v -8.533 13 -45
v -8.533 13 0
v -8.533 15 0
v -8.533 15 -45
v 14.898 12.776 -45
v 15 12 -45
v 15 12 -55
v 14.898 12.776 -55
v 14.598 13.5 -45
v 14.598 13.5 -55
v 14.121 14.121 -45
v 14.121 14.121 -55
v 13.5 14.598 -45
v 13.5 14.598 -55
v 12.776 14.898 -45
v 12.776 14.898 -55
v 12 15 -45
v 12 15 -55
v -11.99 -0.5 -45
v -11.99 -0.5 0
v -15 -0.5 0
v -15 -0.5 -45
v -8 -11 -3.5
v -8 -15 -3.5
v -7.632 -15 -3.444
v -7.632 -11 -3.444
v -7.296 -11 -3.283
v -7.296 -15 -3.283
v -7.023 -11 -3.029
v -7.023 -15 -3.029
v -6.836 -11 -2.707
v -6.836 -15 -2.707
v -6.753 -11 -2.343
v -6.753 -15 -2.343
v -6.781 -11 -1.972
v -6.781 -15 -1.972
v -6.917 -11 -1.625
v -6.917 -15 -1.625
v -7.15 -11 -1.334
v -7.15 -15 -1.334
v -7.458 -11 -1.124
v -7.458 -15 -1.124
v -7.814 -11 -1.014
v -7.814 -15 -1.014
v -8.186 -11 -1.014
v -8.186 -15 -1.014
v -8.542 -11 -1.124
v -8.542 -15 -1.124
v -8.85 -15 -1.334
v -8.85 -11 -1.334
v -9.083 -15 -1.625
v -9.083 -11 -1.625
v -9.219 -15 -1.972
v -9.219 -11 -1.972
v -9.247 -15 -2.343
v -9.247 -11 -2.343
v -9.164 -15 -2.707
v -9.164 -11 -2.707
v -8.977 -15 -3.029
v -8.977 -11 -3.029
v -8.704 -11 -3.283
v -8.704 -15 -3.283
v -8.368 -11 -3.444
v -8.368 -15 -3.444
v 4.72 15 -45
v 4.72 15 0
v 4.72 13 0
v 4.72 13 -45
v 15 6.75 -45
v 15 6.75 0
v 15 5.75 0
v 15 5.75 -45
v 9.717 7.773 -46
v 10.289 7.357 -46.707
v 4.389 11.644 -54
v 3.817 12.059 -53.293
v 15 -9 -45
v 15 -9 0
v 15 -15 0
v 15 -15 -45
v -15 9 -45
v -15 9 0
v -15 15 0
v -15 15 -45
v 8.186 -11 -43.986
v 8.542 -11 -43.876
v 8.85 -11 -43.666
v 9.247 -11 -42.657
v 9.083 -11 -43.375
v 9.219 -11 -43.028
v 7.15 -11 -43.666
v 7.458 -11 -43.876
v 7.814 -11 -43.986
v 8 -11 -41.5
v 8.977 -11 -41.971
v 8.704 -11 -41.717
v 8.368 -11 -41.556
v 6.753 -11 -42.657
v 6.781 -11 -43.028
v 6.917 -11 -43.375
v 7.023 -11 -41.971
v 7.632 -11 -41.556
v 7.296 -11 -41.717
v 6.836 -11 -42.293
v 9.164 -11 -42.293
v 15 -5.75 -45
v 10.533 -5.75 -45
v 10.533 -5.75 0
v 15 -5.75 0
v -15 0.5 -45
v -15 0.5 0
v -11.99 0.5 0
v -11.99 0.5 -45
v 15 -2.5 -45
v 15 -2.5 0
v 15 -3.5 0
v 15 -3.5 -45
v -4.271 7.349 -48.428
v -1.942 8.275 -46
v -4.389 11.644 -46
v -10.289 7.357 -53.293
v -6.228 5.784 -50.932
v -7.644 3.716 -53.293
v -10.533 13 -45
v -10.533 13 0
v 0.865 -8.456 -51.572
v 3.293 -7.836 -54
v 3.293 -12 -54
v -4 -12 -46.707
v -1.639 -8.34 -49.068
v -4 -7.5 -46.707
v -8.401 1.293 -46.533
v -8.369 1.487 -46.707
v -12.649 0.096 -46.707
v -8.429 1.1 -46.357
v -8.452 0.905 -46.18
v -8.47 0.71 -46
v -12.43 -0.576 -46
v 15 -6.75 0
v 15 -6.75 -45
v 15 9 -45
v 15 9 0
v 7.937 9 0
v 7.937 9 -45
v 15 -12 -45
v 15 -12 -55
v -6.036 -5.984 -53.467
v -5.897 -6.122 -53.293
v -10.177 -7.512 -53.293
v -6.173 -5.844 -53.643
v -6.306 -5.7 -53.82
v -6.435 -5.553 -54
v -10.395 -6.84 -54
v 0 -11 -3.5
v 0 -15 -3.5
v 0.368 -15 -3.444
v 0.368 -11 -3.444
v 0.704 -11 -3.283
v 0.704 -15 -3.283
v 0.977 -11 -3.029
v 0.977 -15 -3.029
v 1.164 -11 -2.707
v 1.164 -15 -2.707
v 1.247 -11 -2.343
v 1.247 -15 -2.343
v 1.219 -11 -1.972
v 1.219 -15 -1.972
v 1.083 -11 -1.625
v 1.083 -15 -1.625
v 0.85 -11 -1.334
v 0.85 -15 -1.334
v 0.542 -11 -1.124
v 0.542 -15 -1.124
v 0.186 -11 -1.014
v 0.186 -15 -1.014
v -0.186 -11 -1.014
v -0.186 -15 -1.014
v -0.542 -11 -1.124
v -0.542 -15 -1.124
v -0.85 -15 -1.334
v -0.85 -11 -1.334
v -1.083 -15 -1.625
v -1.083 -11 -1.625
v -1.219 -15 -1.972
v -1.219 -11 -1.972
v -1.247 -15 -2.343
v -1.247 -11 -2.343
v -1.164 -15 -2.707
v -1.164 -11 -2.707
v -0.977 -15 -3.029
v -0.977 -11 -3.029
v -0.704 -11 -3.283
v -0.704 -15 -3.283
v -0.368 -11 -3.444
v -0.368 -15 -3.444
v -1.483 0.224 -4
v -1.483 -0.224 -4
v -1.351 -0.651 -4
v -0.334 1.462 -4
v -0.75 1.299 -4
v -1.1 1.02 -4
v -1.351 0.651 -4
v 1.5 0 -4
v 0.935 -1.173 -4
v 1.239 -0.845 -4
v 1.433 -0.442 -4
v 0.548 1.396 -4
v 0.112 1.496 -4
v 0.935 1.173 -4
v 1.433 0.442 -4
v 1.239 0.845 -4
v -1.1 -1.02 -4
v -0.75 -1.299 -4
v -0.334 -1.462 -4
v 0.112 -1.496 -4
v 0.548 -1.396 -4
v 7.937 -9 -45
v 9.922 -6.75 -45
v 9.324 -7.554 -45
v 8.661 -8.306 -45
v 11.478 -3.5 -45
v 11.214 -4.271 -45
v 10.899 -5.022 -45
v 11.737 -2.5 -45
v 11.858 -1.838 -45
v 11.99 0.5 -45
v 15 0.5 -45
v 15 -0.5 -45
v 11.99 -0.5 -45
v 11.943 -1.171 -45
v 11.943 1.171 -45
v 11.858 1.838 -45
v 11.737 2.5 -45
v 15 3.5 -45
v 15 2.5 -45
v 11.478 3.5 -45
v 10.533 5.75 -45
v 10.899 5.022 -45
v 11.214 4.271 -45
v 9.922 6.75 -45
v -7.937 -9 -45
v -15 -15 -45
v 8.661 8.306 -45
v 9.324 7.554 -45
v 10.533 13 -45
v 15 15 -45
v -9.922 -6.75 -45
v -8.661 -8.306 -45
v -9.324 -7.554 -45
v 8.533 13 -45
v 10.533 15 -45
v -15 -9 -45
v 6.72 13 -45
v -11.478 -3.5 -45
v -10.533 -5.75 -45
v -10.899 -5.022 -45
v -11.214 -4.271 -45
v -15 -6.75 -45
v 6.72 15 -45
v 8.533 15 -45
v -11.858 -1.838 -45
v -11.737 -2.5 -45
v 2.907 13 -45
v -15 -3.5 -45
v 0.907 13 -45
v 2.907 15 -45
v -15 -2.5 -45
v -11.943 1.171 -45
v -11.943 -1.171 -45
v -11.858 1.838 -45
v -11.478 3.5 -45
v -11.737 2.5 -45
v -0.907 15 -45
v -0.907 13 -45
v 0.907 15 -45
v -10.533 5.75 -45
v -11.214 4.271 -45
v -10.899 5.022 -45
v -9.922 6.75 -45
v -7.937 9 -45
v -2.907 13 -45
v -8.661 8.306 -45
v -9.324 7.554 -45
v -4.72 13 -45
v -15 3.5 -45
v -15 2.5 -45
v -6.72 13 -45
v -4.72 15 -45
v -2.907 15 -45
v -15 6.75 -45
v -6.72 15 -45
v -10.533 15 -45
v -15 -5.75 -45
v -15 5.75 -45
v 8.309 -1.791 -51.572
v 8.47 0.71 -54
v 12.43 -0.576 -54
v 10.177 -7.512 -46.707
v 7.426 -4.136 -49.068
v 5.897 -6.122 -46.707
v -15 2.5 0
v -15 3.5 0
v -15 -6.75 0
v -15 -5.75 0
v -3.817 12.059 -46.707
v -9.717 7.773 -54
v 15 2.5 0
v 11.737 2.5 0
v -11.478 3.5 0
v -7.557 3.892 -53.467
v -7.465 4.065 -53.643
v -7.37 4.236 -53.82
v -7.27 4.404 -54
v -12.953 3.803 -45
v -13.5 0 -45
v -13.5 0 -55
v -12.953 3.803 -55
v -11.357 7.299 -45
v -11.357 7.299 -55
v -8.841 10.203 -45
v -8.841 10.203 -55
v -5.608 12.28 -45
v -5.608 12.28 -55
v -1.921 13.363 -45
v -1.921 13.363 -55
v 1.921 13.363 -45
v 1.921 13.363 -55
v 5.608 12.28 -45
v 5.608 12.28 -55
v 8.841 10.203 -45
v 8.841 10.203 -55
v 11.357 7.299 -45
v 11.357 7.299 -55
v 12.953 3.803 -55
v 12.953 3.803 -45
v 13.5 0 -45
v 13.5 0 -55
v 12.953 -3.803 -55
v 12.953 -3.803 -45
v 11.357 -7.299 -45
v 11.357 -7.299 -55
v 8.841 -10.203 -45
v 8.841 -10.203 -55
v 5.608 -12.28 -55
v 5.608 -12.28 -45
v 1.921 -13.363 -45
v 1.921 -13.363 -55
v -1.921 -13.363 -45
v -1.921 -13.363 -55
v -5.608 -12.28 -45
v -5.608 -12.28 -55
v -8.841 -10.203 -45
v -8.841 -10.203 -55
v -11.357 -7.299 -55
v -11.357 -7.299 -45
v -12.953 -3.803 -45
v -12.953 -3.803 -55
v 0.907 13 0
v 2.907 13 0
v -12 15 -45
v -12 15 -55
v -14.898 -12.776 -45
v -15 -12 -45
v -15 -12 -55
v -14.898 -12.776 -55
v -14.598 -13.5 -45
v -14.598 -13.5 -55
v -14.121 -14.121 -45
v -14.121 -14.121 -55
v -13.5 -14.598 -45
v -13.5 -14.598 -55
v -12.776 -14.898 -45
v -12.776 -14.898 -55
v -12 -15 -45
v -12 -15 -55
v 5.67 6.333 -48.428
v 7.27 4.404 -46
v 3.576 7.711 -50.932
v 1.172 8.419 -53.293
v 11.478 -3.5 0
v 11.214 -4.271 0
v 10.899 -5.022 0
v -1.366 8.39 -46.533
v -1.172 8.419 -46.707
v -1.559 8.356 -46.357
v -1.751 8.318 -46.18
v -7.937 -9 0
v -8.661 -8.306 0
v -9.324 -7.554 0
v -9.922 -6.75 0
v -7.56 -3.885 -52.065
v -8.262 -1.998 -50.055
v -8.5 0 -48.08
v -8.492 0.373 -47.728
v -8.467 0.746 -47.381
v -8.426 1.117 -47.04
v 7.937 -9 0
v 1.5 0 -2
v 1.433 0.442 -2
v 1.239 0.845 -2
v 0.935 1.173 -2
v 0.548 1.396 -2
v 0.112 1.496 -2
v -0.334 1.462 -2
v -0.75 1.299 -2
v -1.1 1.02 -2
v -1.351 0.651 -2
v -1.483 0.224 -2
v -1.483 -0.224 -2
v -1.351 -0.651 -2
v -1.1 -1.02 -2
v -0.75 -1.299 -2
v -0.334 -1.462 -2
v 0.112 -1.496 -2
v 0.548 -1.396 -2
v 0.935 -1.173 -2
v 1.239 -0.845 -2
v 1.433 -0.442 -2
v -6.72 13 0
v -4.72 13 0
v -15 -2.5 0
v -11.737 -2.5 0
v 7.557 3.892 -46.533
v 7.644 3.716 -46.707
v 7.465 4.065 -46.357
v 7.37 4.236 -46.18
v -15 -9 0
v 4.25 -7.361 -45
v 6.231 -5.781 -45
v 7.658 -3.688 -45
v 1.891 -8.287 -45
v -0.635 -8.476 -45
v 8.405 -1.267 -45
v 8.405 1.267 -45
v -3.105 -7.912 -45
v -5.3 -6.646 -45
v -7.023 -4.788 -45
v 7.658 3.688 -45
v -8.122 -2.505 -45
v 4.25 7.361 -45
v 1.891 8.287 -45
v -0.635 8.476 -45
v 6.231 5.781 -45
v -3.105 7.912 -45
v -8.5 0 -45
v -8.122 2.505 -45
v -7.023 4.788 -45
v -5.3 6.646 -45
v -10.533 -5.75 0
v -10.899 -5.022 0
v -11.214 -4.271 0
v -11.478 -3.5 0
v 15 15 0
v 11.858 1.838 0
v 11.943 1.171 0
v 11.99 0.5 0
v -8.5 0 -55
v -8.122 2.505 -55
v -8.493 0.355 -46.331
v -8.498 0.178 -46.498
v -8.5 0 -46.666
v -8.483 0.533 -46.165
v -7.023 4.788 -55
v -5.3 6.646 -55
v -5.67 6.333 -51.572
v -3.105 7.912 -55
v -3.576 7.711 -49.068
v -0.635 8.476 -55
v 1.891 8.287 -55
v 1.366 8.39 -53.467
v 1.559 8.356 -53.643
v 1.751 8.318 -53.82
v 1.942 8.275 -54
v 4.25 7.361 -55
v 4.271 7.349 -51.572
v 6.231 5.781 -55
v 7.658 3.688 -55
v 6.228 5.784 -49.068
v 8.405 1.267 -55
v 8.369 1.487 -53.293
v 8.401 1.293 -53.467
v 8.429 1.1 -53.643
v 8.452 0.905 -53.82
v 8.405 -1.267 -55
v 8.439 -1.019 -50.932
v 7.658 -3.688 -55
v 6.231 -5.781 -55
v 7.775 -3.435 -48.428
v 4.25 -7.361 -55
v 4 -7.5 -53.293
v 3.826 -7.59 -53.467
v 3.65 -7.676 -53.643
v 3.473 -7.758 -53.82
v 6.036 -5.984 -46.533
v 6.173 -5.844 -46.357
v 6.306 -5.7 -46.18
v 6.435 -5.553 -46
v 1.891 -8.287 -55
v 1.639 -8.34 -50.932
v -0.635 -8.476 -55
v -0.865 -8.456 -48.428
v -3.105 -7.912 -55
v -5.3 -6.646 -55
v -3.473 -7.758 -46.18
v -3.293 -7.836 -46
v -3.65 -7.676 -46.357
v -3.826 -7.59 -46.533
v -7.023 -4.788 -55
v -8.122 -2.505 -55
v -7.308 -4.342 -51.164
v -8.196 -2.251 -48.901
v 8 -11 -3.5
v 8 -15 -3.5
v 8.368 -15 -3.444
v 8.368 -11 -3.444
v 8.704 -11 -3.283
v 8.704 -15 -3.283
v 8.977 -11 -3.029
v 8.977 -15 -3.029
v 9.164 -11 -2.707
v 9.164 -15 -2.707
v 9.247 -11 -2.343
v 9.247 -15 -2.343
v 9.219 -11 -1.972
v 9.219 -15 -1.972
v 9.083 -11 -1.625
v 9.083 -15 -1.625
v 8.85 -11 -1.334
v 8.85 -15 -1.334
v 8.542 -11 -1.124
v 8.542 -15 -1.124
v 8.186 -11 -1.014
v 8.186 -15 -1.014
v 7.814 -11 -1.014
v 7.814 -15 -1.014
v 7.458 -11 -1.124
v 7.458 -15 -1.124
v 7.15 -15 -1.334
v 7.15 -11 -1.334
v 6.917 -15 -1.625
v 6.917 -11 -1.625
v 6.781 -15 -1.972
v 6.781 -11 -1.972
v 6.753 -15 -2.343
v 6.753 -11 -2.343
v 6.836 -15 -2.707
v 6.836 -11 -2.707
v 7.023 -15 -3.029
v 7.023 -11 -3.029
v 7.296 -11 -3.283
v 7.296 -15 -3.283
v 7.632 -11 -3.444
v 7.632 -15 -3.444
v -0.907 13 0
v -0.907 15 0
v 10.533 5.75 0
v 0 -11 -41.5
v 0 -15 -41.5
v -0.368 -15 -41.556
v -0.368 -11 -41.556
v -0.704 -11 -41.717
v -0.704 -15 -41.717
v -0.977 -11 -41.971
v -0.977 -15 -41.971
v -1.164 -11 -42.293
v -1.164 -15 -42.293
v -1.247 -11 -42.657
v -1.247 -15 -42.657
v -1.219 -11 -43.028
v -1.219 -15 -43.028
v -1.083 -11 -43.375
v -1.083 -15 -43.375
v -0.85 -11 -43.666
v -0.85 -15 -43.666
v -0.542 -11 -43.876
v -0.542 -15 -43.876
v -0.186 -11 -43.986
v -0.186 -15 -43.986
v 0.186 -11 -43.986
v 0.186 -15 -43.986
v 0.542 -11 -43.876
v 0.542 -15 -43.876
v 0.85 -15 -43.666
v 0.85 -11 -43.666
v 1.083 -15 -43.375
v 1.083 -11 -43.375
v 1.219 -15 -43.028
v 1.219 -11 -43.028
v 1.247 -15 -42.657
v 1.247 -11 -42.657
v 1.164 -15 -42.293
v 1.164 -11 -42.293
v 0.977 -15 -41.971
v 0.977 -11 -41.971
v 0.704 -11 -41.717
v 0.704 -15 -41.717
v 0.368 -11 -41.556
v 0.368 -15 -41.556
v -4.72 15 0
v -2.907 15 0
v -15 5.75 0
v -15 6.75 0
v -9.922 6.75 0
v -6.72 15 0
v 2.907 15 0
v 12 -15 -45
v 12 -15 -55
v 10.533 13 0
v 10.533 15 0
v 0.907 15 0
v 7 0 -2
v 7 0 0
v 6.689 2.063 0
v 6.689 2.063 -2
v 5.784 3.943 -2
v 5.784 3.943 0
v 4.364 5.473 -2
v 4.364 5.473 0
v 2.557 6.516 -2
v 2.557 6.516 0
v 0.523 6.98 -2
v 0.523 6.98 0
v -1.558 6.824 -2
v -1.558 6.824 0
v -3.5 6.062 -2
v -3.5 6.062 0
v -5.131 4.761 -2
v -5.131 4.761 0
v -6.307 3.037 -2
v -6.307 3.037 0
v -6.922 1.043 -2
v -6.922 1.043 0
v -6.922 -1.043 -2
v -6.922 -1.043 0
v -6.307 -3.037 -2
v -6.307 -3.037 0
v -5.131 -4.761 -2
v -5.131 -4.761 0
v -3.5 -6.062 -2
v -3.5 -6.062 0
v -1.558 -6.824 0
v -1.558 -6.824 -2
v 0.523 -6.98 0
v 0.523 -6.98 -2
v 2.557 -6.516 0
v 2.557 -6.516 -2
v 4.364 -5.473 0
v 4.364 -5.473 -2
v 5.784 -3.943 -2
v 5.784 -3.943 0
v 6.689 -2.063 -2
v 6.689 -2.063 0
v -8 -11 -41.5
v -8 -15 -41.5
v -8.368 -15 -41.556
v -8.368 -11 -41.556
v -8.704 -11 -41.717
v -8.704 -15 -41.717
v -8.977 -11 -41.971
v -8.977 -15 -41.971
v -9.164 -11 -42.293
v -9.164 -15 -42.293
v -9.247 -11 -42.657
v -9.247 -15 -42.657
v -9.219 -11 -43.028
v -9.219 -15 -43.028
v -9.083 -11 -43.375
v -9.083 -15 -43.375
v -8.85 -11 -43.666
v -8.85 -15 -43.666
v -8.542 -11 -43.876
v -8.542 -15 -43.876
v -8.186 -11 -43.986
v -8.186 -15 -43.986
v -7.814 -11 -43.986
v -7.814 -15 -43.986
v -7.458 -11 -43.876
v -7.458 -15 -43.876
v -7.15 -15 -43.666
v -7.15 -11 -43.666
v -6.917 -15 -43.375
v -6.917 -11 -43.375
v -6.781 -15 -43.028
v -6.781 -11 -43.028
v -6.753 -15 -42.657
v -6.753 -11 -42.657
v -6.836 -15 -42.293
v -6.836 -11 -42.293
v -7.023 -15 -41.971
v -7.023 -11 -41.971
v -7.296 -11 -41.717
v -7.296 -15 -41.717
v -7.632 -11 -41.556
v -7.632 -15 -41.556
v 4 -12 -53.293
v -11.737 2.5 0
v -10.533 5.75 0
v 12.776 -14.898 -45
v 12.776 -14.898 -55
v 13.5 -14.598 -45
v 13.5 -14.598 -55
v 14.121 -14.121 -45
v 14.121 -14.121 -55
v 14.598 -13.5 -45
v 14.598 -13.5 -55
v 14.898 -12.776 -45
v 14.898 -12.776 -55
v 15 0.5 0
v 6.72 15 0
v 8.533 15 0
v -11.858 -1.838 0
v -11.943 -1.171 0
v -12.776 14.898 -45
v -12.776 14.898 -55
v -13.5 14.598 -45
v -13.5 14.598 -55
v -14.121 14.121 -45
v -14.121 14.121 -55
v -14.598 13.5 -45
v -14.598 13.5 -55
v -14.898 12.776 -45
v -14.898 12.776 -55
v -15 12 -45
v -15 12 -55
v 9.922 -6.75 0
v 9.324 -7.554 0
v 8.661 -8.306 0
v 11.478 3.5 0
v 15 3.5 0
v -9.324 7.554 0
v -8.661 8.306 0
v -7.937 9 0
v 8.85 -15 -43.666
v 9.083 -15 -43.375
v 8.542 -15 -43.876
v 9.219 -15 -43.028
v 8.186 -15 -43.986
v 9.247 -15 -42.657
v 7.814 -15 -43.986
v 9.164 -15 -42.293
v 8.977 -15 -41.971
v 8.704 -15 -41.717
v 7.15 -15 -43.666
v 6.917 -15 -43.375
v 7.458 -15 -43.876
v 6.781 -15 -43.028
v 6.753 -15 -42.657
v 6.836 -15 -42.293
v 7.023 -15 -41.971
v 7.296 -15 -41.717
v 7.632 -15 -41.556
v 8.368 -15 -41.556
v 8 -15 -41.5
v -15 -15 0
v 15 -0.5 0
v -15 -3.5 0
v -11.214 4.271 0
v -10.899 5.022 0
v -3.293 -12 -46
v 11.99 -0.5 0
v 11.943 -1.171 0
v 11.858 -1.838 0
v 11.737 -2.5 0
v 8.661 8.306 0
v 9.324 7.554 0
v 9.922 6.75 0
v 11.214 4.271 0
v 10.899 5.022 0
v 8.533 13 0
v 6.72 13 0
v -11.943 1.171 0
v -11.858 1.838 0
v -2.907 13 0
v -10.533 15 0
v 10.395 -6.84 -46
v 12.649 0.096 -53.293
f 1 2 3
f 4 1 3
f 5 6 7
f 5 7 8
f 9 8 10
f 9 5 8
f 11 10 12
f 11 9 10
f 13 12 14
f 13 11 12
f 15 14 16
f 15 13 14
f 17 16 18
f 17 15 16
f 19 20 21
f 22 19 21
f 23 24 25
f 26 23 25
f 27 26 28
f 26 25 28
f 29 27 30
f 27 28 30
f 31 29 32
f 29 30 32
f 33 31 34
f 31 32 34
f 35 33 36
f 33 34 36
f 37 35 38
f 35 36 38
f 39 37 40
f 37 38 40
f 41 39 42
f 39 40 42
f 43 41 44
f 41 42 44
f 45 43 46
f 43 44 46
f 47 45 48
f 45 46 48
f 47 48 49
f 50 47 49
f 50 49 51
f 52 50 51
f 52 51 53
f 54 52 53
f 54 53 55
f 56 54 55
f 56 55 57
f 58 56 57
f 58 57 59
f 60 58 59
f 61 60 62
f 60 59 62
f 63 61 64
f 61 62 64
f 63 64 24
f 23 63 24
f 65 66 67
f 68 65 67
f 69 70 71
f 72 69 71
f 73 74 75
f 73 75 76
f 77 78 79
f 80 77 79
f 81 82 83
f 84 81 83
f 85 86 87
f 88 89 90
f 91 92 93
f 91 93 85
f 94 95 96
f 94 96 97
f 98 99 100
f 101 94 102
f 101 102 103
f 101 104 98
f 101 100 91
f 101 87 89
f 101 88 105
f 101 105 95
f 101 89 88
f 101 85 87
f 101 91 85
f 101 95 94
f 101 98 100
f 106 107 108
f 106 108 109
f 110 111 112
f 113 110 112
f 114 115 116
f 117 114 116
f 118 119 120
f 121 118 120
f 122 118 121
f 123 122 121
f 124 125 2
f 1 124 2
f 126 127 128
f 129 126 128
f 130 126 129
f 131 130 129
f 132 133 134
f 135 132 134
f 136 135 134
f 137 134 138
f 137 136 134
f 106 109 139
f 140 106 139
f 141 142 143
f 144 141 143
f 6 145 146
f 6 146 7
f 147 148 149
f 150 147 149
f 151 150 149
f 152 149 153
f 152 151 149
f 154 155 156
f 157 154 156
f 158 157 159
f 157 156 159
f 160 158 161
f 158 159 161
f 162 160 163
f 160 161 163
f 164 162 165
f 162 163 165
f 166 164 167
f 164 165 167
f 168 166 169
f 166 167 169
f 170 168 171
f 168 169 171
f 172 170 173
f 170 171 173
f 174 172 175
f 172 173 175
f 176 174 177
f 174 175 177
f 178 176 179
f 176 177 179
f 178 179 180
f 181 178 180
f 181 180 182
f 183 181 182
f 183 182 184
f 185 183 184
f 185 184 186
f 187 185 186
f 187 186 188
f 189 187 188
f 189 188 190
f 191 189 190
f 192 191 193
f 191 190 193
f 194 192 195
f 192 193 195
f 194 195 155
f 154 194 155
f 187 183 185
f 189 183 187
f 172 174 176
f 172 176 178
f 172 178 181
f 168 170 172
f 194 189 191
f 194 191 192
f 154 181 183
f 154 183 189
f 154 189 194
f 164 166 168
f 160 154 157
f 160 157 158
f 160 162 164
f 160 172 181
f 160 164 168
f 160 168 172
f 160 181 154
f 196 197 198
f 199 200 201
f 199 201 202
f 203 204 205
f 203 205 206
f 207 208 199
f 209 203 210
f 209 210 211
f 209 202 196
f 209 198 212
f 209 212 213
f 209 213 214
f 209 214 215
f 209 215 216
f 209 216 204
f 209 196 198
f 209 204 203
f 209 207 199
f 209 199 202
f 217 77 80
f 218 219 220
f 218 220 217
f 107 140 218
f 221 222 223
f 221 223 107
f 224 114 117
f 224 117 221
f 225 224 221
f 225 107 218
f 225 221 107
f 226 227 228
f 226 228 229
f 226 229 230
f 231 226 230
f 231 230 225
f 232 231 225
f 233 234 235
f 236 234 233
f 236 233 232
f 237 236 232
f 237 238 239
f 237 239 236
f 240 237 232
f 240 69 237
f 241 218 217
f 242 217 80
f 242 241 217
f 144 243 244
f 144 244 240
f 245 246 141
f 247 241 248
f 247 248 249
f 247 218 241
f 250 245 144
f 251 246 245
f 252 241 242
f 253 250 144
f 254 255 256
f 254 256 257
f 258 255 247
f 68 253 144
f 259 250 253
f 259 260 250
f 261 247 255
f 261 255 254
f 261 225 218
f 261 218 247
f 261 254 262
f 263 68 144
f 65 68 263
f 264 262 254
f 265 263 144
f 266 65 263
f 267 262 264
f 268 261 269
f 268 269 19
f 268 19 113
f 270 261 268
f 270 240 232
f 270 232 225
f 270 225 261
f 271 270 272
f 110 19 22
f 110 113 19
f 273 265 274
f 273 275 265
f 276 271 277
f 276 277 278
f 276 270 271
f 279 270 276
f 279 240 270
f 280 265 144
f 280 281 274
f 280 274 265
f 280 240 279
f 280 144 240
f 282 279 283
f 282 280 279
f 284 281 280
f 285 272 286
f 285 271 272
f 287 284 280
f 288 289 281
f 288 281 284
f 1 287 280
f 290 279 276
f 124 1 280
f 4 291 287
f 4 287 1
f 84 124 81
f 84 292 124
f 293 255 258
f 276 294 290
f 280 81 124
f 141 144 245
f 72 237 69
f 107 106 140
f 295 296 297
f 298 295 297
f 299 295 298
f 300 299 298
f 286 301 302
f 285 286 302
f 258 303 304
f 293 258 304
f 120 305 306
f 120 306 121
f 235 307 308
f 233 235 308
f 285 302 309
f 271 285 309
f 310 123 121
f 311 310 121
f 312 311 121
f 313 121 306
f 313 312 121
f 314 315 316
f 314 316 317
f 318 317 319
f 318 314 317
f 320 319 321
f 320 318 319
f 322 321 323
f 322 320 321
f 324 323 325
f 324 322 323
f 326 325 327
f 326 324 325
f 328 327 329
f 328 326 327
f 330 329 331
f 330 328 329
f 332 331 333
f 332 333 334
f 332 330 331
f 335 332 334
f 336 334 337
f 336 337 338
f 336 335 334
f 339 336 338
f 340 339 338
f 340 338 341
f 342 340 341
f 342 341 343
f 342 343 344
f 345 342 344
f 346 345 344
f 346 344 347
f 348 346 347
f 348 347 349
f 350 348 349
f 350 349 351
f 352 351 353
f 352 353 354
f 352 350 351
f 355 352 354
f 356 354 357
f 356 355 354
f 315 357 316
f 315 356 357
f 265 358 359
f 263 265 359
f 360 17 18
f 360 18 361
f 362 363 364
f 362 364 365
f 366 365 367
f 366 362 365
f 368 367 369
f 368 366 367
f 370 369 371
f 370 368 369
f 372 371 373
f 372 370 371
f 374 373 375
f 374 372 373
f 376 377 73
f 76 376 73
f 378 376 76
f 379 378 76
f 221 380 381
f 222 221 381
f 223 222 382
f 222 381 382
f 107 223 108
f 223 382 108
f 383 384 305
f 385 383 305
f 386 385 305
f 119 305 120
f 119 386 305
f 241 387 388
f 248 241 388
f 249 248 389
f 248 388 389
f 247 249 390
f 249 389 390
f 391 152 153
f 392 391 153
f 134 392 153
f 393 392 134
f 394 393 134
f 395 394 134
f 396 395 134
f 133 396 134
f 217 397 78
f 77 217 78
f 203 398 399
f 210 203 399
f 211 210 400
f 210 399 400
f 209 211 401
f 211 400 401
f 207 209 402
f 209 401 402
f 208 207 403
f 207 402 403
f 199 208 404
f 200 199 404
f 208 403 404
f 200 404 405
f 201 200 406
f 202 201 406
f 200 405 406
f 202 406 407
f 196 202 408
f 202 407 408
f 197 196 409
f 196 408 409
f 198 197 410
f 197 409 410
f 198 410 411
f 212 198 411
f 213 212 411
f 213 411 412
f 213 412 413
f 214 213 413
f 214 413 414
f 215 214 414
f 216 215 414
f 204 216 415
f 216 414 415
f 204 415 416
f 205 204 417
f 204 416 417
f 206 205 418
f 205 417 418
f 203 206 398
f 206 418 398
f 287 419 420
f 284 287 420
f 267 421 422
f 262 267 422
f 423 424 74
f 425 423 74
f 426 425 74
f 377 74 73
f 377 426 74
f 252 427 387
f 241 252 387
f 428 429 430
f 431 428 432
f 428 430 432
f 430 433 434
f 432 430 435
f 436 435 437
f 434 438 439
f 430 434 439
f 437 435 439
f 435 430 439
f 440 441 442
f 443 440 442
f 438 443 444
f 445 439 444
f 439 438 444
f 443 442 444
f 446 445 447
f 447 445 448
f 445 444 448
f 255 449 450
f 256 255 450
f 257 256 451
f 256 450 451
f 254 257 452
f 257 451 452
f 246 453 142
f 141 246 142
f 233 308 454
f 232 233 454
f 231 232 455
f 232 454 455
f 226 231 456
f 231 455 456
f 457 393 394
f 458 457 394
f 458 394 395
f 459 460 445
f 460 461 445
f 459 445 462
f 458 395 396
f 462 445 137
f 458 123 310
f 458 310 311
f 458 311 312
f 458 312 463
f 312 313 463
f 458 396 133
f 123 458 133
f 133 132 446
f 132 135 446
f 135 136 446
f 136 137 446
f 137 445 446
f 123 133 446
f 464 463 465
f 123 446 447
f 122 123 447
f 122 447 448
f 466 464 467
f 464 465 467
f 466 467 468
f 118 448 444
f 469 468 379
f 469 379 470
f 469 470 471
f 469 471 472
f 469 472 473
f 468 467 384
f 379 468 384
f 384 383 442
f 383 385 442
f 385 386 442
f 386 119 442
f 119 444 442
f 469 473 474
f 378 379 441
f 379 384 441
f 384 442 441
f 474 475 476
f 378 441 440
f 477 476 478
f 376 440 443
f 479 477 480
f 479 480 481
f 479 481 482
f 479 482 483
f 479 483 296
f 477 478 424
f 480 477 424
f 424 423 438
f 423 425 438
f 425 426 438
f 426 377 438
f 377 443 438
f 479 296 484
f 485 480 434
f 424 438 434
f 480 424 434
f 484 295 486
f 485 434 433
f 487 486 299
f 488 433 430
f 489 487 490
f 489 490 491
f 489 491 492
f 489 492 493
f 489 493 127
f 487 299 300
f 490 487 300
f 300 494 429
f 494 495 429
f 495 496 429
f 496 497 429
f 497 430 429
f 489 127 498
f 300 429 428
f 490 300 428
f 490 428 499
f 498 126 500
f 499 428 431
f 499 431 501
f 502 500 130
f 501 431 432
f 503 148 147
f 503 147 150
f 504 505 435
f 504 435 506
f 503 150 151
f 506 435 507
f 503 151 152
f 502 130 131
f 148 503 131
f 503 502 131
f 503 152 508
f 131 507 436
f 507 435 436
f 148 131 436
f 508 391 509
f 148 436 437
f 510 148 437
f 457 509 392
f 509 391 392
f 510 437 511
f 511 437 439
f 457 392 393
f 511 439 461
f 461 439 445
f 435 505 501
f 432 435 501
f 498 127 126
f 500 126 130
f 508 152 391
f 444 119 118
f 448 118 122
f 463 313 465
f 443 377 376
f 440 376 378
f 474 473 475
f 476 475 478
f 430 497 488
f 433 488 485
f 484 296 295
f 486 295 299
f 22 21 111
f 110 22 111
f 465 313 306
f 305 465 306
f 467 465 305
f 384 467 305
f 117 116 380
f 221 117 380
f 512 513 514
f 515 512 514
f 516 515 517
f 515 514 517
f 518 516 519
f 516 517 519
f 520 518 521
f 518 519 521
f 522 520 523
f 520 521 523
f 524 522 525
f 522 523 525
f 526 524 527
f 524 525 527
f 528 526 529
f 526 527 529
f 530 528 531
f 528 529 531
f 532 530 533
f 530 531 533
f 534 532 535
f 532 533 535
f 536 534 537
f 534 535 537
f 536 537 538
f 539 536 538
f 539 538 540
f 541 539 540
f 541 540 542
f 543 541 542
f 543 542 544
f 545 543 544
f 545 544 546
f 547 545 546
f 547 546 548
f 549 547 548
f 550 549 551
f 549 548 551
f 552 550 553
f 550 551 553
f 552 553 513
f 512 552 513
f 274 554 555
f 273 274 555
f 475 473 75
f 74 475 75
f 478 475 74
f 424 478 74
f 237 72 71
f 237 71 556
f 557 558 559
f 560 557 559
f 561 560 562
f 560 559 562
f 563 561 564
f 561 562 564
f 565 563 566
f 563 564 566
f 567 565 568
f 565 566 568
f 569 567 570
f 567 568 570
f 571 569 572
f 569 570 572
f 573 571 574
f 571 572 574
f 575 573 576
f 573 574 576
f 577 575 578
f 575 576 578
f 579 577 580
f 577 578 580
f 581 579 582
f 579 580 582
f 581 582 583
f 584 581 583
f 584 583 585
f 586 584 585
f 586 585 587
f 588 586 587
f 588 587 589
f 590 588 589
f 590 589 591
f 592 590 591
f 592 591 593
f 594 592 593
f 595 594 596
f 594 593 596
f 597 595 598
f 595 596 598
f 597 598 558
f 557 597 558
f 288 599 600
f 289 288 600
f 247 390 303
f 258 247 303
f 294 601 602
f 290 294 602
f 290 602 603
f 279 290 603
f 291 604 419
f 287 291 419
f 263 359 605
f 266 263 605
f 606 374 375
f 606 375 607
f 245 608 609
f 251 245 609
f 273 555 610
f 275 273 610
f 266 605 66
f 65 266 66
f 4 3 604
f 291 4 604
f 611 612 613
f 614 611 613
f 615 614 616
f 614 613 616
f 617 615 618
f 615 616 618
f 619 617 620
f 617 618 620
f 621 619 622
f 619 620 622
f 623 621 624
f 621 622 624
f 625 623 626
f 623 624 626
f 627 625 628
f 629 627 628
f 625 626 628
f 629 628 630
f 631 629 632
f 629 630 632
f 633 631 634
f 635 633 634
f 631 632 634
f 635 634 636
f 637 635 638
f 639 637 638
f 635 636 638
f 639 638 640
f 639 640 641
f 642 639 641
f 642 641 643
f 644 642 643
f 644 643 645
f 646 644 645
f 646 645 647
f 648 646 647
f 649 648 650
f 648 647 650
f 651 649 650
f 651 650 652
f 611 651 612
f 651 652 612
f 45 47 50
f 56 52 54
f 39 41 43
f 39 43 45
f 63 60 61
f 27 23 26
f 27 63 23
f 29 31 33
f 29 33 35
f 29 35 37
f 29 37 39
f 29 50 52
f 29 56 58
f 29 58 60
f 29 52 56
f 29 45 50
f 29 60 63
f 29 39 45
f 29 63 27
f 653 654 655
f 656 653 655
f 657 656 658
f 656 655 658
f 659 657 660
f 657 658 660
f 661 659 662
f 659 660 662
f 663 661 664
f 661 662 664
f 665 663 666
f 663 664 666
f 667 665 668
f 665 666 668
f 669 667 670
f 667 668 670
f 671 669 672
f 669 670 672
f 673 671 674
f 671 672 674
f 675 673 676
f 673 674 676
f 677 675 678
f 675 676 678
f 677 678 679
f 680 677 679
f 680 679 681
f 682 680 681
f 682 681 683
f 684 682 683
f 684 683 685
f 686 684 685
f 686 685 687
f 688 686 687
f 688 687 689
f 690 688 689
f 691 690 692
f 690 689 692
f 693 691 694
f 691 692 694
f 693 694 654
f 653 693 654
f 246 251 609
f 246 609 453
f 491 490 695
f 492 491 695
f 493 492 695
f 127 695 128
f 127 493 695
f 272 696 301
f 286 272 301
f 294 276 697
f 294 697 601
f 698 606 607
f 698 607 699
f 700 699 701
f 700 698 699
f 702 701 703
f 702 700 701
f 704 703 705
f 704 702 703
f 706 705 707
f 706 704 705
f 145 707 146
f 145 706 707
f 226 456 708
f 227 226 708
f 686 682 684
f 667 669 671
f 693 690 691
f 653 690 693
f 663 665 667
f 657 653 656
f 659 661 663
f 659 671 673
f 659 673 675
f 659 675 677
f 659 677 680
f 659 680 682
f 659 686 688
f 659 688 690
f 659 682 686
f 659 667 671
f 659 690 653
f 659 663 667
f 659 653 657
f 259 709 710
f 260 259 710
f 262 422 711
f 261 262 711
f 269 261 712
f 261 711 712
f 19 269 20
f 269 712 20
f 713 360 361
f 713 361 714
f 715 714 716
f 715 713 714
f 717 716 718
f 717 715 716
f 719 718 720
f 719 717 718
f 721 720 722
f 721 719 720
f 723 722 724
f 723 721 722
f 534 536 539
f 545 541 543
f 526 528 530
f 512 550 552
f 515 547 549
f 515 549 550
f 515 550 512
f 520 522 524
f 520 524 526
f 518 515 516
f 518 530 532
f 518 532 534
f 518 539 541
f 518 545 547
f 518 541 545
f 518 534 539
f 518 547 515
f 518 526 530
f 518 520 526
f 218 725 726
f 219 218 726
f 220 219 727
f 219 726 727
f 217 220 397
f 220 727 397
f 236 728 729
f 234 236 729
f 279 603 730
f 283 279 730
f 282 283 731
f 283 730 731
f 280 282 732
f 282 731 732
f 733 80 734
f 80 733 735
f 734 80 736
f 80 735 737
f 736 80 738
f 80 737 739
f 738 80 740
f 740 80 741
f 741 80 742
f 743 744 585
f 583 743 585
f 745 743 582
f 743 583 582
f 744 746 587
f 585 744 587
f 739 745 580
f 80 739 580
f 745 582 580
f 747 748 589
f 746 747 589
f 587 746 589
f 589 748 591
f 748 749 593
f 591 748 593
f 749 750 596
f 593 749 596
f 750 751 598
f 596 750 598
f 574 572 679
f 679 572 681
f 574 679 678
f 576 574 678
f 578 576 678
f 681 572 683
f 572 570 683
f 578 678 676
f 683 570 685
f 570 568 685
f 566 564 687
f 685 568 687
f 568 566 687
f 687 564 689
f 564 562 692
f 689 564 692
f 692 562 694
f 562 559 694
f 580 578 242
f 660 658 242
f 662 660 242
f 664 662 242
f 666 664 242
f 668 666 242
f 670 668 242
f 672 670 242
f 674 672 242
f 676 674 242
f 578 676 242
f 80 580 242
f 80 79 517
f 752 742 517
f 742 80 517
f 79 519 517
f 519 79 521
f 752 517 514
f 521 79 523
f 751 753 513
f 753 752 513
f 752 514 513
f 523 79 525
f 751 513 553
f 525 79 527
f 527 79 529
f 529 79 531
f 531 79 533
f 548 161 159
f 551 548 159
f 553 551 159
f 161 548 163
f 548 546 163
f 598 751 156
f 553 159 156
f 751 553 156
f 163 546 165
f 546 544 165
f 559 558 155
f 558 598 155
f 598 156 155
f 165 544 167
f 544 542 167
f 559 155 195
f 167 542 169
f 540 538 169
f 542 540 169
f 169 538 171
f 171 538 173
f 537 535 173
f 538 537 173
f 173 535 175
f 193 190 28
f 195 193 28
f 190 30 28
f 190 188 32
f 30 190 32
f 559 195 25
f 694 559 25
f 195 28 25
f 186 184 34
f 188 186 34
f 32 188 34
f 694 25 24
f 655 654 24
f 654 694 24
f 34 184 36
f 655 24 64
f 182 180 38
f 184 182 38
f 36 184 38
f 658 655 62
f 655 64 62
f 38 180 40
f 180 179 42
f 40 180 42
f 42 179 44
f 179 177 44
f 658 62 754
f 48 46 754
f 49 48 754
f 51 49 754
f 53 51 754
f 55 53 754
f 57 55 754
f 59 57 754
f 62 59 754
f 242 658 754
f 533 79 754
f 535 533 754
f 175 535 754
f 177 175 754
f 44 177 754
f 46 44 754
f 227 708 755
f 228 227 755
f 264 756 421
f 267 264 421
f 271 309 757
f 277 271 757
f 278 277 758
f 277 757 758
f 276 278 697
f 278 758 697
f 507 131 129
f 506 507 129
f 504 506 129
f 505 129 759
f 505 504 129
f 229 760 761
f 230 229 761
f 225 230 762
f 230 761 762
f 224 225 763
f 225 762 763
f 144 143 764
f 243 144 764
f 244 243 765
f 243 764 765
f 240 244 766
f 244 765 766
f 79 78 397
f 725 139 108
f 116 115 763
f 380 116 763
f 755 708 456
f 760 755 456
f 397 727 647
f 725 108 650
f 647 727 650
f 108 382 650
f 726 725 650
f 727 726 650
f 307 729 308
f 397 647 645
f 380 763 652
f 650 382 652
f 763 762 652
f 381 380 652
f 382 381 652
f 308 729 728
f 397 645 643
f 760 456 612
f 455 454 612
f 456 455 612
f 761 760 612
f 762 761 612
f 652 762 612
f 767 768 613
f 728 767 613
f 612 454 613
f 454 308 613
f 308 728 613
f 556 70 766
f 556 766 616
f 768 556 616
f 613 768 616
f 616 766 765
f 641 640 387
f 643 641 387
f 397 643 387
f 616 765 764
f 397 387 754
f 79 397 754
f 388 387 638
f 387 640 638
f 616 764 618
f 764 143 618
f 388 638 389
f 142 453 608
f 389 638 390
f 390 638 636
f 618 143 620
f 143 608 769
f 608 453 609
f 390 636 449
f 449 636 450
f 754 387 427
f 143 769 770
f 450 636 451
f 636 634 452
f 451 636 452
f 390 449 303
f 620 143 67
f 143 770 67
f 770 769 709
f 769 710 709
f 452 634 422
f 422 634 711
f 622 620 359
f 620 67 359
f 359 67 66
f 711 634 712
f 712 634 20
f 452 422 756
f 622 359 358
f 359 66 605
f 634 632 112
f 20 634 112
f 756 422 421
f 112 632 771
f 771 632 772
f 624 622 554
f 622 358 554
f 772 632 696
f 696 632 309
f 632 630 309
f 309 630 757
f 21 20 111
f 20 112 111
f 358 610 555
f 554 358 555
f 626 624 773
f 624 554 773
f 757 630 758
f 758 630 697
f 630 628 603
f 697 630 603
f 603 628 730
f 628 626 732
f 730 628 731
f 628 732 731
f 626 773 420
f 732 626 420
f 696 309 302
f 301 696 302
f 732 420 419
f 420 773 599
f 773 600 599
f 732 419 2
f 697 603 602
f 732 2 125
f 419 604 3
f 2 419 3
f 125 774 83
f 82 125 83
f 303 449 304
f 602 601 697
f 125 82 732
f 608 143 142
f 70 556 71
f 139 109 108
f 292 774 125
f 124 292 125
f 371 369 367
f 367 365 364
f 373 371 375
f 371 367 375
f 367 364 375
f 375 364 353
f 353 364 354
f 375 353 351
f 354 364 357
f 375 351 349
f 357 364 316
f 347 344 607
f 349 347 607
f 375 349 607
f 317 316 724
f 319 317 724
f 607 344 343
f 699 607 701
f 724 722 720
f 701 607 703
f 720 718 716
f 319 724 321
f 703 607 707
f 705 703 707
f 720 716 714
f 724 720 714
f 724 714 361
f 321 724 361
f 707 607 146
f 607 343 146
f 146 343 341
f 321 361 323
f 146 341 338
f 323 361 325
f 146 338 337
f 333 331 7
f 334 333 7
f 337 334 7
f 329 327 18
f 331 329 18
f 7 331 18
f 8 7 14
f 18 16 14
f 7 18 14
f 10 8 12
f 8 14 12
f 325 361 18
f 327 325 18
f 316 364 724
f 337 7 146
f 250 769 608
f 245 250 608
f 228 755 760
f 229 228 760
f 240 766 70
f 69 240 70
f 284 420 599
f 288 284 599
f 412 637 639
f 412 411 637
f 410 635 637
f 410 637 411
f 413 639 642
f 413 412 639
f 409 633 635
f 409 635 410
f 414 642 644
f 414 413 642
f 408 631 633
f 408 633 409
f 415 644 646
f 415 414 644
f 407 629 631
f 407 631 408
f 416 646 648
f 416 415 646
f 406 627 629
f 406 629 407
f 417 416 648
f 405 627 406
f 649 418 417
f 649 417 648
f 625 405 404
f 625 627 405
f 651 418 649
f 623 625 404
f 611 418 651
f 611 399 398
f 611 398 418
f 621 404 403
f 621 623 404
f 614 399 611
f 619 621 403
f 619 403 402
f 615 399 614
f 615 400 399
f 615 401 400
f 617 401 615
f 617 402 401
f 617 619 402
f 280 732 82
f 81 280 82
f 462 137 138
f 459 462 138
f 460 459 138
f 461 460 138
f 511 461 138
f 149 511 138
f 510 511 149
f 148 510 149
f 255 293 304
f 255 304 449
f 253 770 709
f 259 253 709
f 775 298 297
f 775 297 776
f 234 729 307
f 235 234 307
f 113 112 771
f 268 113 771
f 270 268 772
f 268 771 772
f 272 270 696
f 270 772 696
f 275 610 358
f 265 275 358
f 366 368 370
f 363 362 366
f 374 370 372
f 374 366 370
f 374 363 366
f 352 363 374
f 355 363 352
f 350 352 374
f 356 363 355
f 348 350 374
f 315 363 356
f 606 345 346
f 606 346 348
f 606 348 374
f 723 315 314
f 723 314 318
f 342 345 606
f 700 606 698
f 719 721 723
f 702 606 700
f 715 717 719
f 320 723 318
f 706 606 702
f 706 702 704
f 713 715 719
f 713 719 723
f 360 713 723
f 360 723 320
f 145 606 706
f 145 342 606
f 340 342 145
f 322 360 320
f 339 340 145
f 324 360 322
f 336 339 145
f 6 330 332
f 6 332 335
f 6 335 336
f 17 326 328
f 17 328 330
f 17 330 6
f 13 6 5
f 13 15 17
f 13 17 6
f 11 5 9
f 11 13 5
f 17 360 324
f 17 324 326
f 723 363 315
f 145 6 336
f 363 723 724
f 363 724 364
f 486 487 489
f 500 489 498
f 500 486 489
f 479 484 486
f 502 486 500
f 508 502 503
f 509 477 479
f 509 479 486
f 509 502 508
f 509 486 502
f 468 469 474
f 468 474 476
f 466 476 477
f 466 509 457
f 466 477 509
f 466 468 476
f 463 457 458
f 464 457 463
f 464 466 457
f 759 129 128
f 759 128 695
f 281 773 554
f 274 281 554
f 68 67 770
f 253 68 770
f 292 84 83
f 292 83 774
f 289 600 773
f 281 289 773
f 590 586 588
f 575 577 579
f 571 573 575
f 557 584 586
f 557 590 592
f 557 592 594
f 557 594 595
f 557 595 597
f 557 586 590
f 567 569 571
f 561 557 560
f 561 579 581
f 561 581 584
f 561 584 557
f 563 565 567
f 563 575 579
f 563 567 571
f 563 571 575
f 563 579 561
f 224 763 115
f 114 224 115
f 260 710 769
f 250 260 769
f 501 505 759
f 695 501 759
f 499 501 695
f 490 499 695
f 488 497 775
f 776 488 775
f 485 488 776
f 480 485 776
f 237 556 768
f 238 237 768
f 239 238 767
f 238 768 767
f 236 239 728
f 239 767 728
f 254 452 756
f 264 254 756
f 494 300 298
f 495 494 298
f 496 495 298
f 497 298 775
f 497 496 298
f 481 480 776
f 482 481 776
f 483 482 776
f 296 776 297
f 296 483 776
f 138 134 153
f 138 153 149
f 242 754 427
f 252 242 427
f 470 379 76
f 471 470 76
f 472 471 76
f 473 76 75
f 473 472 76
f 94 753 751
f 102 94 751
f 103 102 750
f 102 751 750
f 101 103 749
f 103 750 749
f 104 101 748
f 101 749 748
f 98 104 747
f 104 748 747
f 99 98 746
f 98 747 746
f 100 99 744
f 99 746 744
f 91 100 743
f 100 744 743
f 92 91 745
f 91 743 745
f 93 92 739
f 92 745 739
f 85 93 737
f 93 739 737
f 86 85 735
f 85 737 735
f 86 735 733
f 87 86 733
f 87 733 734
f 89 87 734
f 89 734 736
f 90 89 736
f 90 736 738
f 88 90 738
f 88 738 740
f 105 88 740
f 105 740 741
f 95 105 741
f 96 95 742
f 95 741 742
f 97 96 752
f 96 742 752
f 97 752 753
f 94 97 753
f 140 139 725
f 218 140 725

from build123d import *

# Parameters (mm, degrees)
BOSS_EXTRUDE1_DEPTH = 45
SKETCH2_R           = 7
CUT_EXTRUDE1_DEPTH  = 2
SKETCH3_R           = 1.5
CUT_EXTRUDE2_DEPTH  = 2
SKETCH4_R           = 1.25
CUT_EXTRUDE5_DEPTH  = 4
SKETCH5_R           = 13.5
BOSS_EXTRUDE2_DEPTH = 10
SKETCH6_R           = 8.5
BOSS_EXTRUDE3_DEPTH = 10
BOSS_EXTRUDE4_DEPTH = 12
CIRPATTERN1_COUNT   = 5


with BuildPart() as part:
    # Sketch1 → Boss-Extrude1 (new body)
    with BuildSketch(Plane.XY):
        with BuildLine():
            Line((-15, -9), (-7.937253933, -9))
            ThreePointArc((-7.937253933, -9), (-9, -7.937253933), (-9.921567416, -6.75))
            Line((-9.921567416, -6.75), (-15, -6.75))
            Line((-15, -6.75), (-15, -5.75))
            Line((-15, -5.75), (-10.532687216, -5.75))
            ThreePointArc((-10.532687216, -5.75), (-11.06281417, -4.649101273), (-11.478240283, -3.5))
            Line((-11.478240283, -3.5), (-15, -3.5))
            Line((-15, -3.5), (-15, -2.5))
            Line((-15, -2.5), (-11.736694594, -2.5))
            ThreePointArc((-11.736694594, -2.5), (-11.905209464, -1.505319769), (-11.989578808, -0.5))
            Line((-11.989578808, -0.5), (-15, -0.5))
            Line((-15, -0.5), (-15, 0.5))
            Line((-15, 0.5), (-11.989578808, 0.5))
            ThreePointArc((-11.989578808, 0.5), (-11.905209464, 1.505319769), (-11.736694594, 2.5))
            Line((-11.736694594, 2.5), (-15, 2.5))
            Line((-15, 2.5), (-15, 3.5))
            Line((-15, 3.5), (-11.478240283, 3.5))
            ThreePointArc((-11.478240283, 3.5), (-11.06281417, 4.649101273), (-10.532687216, 5.75))
            Line((-10.532687216, 5.75), (-15, 5.75))
            Line((-15, 5.75), (-15, 6.75))
            Line((-15, 6.75), (-9.921567416, 6.75))
            ThreePointArc((-9.921567416, 6.75), (-9, 7.937253933), (-7.937253933, 9))
            Line((-7.937253933, 9), (-15, 9))
            Line((-15, 9), (-15, 15))
            Line((-15, 15), (-10.532687216, 15))
            Line((-10.532687216, 15), (-10.532687216, 13))
            Line((-10.532687216, 13), (-8.532687216, 13))
            Line((-8.532687216, 13), (-8.532687216, 15))
            Line((-8.532687216, 15), (-6.71961233, 15))
            Line((-6.71961233, 15), (-6.71961233, 13))
            Line((-6.71961233, 13), (-4.71961233, 13))
            Line((-4.71961233, 13), (-4.71961233, 15))
            Line((-4.71961233, 15), (-2.906537443, 15))
            Line((-2.906537443, 15), (-2.906537443, 13))
            Line((-2.906537443, 13), (-0.906537443, 13))
            Line((-0.906537443, 13), (-0.906537443, 15))
            Line((-0.906537443, 15), (0.906537443, 15))
            Line((0.906537443, 15), (0.906537443, 13))
            Line((0.906537443, 13), (2.906537443, 13))
            Line((2.906537443, 13), (2.906537443, 15))
            Line((2.906537443, 15), (4.71961233, 15))
            Line((4.71961233, 15), (4.71961233, 13))
            Line((4.71961233, 13), (6.71961233, 13))
            Line((6.71961233, 13), (6.71961233, 15))
            Line((6.71961233, 15), (8.532687216, 15))
            Line((8.532687216, 15), (8.532687216, 13))
            Line((8.532687216, 13), (10.532687216, 13))
            Line((10.532687216, 13), (10.532687216, 15))
            Line((10.532687216, 15), (15, 15))
            Line((15, 15), (15, 9))
            Line((15, 9), (7.937253933, 9))
            ThreePointArc((7.937253933, 9), (9, 7.937253933), (9.921567416, 6.75))
            Line((9.921567416, 6.75), (15, 6.75))
            Line((15, 6.75), (15, 5.75))
            Line((15, 5.75), (10.532687216, 5.75))
            ThreePointArc((10.532687216, 5.75), (11.06281417, 4.649101273), (11.478240283, 3.5))
            Line((11.478240283, 3.5), (15, 3.5))
            Line((15, 3.5), (15, 2.5))
            Line((15, 2.5), (11.736694594, 2.5))
            ThreePointArc((11.736694594, 2.5), (11.905209464, 1.505319769), (11.989578808, 0.5))
            Line((11.989578808, 0.5), (15, 0.5))
            Line((15, 0.5), (15, -0.5))
            Line((15, -0.5), (11.989578808, -0.5))
            ThreePointArc((11.989578808, -0.5), (11.905209464, -1.505319769), (11.736694594, -2.5))
            Line((11.736694594, -2.5), (15, -2.5))
            Line((15, -2.5), (15, -3.5))
            Line((15, -3.5), (11.478240283, -3.5))
            ThreePointArc((11.478240283, -3.5), (11.06281417, -4.649101273), (10.532687216, -5.75))
            Line((10.532687216, -5.75), (15, -5.75))
            Line((15, -5.75), (15, -6.75))
            Line((15, -6.75), (9.921567416, -6.75))
            ThreePointArc((9.921567416, -6.75), (9, -7.937253933), (7.937253933, -9))
            Line((7.937253933, -9), (15, -9))
            Line((15, -9), (15, -15))
            Line((15, -15), (-15, -15))
            Line((-15, -15), (-15, -9))
        make_face()
    extrude(amount=-BOSS_EXTRUDE1_DEPTH)

    # Sketch2 → Cut-Extrude1 (cut)
    with BuildSketch(Plane.XY):
        Circle(SKETCH2_R)
    extrude(amount=-CUT_EXTRUDE1_DEPTH, mode=Mode.SUBTRACT)

    # Sketch3 → Cut-Extrude2 (cut)
    with BuildSketch(Plane.XY.offset(-2)):
        Circle(SKETCH3_R)
    extrude(amount=-CUT_EXTRUDE2_DEPTH, mode=Mode.SUBTRACT)

    # Sketch4 → Cut-Extrude5 (cut)
    with BuildSketch(Plane.XZ.offset(15)):
        with Locations(Location((-8, -2.25, 0), (0, 0, 270))):
            Circle(SKETCH4_R)
        with Locations(Location((0, -2.25, 0), (0, 0, 270))):
            Circle(SKETCH4_R)
        with Locations(Location((8, -2.25, 0), (0, 0, 270))):
            Circle(SKETCH4_R)
        with Locations(Location((8, -42.75, 0), (0, 0, 90))):
            Circle(SKETCH4_R)
        with Locations(Location((0, -42.75, 0), (0, 0, 90))):
            Circle(SKETCH4_R)
        with Locations(Location((-8, -42.75, 0), (0, 0, 90))):
            Circle(SKETCH4_R)
    extrude(amount=-CUT_EXTRUDE5_DEPTH, mode=Mode.SUBTRACT)


with BuildPart() as body_2:
    # Sketch5 → Boss-Extrude2 (new body)
    with BuildSketch(Plane(origin=(0, 0, -45), x_dir=(-1, 0, 0), z_dir=(0, 0, -1))):
        with BuildLine():
            Line((-12, 15), (12, 15))
            ThreePointArc((12, 15), (14.121320344, 14.121320344), (15, 12))
            Line((15, 12), (15, -12))
            ThreePointArc((15, -12), (14.121320344, -14.121320344), (12, -15))
            Line((12, -15), (-12, -15))
            ThreePointArc((-12, -15), (-14.121320344, -14.121320344), (-15, -12))
            Line((-15, -12), (-15, 12))
            ThreePointArc((-15, 12), (-14.121320344, 14.121320344), (-12, 15))
        make_face()
        Circle(SKETCH5_R, mode=Mode.SUBTRACT)
    extrude(amount=BOSS_EXTRUDE2_DEPTH)


with BuildPart() as body_3:
    # Sketch6 → Boss-Extrude3 (new body)
    with BuildSketch(Plane(origin=(0, 0, -45), x_dir=(-1, 0, 0), z_dir=(0, 0, -1))):
        Circle(SKETCH6_R)
    extrude(amount=BOSS_EXTRUDE3_DEPTH)

    # Sketch7 → Boss-Extrude4 (add)
    with BuildSketch(Plane(origin=(0, 0, 0), x_dir=(-1, 0, 0), z_dir=(0, -1, 0))):
        Polygon((-4, 53.292893219), (-3.292893219, 54), (4, 46.707106781), (3.292893219, 46), align=None)
    boss_extrude4 = extrude(amount=BOSS_EXTRUDE4_DEPTH)

    # CirPattern1: Boss-Extrude4 ×5 about axis
    cirpattern1_axis = Axis((0, 0, 0), (0, 0, 1))
    for i in range(1, CIRPATTERN1_COUNT):
        add(boss_extrude4.rotate(cirpattern1_axis, i * 360 / CIRPATTERN1_COUNT))


solid = Compound([part.part, body_2.part, body_3.part])
